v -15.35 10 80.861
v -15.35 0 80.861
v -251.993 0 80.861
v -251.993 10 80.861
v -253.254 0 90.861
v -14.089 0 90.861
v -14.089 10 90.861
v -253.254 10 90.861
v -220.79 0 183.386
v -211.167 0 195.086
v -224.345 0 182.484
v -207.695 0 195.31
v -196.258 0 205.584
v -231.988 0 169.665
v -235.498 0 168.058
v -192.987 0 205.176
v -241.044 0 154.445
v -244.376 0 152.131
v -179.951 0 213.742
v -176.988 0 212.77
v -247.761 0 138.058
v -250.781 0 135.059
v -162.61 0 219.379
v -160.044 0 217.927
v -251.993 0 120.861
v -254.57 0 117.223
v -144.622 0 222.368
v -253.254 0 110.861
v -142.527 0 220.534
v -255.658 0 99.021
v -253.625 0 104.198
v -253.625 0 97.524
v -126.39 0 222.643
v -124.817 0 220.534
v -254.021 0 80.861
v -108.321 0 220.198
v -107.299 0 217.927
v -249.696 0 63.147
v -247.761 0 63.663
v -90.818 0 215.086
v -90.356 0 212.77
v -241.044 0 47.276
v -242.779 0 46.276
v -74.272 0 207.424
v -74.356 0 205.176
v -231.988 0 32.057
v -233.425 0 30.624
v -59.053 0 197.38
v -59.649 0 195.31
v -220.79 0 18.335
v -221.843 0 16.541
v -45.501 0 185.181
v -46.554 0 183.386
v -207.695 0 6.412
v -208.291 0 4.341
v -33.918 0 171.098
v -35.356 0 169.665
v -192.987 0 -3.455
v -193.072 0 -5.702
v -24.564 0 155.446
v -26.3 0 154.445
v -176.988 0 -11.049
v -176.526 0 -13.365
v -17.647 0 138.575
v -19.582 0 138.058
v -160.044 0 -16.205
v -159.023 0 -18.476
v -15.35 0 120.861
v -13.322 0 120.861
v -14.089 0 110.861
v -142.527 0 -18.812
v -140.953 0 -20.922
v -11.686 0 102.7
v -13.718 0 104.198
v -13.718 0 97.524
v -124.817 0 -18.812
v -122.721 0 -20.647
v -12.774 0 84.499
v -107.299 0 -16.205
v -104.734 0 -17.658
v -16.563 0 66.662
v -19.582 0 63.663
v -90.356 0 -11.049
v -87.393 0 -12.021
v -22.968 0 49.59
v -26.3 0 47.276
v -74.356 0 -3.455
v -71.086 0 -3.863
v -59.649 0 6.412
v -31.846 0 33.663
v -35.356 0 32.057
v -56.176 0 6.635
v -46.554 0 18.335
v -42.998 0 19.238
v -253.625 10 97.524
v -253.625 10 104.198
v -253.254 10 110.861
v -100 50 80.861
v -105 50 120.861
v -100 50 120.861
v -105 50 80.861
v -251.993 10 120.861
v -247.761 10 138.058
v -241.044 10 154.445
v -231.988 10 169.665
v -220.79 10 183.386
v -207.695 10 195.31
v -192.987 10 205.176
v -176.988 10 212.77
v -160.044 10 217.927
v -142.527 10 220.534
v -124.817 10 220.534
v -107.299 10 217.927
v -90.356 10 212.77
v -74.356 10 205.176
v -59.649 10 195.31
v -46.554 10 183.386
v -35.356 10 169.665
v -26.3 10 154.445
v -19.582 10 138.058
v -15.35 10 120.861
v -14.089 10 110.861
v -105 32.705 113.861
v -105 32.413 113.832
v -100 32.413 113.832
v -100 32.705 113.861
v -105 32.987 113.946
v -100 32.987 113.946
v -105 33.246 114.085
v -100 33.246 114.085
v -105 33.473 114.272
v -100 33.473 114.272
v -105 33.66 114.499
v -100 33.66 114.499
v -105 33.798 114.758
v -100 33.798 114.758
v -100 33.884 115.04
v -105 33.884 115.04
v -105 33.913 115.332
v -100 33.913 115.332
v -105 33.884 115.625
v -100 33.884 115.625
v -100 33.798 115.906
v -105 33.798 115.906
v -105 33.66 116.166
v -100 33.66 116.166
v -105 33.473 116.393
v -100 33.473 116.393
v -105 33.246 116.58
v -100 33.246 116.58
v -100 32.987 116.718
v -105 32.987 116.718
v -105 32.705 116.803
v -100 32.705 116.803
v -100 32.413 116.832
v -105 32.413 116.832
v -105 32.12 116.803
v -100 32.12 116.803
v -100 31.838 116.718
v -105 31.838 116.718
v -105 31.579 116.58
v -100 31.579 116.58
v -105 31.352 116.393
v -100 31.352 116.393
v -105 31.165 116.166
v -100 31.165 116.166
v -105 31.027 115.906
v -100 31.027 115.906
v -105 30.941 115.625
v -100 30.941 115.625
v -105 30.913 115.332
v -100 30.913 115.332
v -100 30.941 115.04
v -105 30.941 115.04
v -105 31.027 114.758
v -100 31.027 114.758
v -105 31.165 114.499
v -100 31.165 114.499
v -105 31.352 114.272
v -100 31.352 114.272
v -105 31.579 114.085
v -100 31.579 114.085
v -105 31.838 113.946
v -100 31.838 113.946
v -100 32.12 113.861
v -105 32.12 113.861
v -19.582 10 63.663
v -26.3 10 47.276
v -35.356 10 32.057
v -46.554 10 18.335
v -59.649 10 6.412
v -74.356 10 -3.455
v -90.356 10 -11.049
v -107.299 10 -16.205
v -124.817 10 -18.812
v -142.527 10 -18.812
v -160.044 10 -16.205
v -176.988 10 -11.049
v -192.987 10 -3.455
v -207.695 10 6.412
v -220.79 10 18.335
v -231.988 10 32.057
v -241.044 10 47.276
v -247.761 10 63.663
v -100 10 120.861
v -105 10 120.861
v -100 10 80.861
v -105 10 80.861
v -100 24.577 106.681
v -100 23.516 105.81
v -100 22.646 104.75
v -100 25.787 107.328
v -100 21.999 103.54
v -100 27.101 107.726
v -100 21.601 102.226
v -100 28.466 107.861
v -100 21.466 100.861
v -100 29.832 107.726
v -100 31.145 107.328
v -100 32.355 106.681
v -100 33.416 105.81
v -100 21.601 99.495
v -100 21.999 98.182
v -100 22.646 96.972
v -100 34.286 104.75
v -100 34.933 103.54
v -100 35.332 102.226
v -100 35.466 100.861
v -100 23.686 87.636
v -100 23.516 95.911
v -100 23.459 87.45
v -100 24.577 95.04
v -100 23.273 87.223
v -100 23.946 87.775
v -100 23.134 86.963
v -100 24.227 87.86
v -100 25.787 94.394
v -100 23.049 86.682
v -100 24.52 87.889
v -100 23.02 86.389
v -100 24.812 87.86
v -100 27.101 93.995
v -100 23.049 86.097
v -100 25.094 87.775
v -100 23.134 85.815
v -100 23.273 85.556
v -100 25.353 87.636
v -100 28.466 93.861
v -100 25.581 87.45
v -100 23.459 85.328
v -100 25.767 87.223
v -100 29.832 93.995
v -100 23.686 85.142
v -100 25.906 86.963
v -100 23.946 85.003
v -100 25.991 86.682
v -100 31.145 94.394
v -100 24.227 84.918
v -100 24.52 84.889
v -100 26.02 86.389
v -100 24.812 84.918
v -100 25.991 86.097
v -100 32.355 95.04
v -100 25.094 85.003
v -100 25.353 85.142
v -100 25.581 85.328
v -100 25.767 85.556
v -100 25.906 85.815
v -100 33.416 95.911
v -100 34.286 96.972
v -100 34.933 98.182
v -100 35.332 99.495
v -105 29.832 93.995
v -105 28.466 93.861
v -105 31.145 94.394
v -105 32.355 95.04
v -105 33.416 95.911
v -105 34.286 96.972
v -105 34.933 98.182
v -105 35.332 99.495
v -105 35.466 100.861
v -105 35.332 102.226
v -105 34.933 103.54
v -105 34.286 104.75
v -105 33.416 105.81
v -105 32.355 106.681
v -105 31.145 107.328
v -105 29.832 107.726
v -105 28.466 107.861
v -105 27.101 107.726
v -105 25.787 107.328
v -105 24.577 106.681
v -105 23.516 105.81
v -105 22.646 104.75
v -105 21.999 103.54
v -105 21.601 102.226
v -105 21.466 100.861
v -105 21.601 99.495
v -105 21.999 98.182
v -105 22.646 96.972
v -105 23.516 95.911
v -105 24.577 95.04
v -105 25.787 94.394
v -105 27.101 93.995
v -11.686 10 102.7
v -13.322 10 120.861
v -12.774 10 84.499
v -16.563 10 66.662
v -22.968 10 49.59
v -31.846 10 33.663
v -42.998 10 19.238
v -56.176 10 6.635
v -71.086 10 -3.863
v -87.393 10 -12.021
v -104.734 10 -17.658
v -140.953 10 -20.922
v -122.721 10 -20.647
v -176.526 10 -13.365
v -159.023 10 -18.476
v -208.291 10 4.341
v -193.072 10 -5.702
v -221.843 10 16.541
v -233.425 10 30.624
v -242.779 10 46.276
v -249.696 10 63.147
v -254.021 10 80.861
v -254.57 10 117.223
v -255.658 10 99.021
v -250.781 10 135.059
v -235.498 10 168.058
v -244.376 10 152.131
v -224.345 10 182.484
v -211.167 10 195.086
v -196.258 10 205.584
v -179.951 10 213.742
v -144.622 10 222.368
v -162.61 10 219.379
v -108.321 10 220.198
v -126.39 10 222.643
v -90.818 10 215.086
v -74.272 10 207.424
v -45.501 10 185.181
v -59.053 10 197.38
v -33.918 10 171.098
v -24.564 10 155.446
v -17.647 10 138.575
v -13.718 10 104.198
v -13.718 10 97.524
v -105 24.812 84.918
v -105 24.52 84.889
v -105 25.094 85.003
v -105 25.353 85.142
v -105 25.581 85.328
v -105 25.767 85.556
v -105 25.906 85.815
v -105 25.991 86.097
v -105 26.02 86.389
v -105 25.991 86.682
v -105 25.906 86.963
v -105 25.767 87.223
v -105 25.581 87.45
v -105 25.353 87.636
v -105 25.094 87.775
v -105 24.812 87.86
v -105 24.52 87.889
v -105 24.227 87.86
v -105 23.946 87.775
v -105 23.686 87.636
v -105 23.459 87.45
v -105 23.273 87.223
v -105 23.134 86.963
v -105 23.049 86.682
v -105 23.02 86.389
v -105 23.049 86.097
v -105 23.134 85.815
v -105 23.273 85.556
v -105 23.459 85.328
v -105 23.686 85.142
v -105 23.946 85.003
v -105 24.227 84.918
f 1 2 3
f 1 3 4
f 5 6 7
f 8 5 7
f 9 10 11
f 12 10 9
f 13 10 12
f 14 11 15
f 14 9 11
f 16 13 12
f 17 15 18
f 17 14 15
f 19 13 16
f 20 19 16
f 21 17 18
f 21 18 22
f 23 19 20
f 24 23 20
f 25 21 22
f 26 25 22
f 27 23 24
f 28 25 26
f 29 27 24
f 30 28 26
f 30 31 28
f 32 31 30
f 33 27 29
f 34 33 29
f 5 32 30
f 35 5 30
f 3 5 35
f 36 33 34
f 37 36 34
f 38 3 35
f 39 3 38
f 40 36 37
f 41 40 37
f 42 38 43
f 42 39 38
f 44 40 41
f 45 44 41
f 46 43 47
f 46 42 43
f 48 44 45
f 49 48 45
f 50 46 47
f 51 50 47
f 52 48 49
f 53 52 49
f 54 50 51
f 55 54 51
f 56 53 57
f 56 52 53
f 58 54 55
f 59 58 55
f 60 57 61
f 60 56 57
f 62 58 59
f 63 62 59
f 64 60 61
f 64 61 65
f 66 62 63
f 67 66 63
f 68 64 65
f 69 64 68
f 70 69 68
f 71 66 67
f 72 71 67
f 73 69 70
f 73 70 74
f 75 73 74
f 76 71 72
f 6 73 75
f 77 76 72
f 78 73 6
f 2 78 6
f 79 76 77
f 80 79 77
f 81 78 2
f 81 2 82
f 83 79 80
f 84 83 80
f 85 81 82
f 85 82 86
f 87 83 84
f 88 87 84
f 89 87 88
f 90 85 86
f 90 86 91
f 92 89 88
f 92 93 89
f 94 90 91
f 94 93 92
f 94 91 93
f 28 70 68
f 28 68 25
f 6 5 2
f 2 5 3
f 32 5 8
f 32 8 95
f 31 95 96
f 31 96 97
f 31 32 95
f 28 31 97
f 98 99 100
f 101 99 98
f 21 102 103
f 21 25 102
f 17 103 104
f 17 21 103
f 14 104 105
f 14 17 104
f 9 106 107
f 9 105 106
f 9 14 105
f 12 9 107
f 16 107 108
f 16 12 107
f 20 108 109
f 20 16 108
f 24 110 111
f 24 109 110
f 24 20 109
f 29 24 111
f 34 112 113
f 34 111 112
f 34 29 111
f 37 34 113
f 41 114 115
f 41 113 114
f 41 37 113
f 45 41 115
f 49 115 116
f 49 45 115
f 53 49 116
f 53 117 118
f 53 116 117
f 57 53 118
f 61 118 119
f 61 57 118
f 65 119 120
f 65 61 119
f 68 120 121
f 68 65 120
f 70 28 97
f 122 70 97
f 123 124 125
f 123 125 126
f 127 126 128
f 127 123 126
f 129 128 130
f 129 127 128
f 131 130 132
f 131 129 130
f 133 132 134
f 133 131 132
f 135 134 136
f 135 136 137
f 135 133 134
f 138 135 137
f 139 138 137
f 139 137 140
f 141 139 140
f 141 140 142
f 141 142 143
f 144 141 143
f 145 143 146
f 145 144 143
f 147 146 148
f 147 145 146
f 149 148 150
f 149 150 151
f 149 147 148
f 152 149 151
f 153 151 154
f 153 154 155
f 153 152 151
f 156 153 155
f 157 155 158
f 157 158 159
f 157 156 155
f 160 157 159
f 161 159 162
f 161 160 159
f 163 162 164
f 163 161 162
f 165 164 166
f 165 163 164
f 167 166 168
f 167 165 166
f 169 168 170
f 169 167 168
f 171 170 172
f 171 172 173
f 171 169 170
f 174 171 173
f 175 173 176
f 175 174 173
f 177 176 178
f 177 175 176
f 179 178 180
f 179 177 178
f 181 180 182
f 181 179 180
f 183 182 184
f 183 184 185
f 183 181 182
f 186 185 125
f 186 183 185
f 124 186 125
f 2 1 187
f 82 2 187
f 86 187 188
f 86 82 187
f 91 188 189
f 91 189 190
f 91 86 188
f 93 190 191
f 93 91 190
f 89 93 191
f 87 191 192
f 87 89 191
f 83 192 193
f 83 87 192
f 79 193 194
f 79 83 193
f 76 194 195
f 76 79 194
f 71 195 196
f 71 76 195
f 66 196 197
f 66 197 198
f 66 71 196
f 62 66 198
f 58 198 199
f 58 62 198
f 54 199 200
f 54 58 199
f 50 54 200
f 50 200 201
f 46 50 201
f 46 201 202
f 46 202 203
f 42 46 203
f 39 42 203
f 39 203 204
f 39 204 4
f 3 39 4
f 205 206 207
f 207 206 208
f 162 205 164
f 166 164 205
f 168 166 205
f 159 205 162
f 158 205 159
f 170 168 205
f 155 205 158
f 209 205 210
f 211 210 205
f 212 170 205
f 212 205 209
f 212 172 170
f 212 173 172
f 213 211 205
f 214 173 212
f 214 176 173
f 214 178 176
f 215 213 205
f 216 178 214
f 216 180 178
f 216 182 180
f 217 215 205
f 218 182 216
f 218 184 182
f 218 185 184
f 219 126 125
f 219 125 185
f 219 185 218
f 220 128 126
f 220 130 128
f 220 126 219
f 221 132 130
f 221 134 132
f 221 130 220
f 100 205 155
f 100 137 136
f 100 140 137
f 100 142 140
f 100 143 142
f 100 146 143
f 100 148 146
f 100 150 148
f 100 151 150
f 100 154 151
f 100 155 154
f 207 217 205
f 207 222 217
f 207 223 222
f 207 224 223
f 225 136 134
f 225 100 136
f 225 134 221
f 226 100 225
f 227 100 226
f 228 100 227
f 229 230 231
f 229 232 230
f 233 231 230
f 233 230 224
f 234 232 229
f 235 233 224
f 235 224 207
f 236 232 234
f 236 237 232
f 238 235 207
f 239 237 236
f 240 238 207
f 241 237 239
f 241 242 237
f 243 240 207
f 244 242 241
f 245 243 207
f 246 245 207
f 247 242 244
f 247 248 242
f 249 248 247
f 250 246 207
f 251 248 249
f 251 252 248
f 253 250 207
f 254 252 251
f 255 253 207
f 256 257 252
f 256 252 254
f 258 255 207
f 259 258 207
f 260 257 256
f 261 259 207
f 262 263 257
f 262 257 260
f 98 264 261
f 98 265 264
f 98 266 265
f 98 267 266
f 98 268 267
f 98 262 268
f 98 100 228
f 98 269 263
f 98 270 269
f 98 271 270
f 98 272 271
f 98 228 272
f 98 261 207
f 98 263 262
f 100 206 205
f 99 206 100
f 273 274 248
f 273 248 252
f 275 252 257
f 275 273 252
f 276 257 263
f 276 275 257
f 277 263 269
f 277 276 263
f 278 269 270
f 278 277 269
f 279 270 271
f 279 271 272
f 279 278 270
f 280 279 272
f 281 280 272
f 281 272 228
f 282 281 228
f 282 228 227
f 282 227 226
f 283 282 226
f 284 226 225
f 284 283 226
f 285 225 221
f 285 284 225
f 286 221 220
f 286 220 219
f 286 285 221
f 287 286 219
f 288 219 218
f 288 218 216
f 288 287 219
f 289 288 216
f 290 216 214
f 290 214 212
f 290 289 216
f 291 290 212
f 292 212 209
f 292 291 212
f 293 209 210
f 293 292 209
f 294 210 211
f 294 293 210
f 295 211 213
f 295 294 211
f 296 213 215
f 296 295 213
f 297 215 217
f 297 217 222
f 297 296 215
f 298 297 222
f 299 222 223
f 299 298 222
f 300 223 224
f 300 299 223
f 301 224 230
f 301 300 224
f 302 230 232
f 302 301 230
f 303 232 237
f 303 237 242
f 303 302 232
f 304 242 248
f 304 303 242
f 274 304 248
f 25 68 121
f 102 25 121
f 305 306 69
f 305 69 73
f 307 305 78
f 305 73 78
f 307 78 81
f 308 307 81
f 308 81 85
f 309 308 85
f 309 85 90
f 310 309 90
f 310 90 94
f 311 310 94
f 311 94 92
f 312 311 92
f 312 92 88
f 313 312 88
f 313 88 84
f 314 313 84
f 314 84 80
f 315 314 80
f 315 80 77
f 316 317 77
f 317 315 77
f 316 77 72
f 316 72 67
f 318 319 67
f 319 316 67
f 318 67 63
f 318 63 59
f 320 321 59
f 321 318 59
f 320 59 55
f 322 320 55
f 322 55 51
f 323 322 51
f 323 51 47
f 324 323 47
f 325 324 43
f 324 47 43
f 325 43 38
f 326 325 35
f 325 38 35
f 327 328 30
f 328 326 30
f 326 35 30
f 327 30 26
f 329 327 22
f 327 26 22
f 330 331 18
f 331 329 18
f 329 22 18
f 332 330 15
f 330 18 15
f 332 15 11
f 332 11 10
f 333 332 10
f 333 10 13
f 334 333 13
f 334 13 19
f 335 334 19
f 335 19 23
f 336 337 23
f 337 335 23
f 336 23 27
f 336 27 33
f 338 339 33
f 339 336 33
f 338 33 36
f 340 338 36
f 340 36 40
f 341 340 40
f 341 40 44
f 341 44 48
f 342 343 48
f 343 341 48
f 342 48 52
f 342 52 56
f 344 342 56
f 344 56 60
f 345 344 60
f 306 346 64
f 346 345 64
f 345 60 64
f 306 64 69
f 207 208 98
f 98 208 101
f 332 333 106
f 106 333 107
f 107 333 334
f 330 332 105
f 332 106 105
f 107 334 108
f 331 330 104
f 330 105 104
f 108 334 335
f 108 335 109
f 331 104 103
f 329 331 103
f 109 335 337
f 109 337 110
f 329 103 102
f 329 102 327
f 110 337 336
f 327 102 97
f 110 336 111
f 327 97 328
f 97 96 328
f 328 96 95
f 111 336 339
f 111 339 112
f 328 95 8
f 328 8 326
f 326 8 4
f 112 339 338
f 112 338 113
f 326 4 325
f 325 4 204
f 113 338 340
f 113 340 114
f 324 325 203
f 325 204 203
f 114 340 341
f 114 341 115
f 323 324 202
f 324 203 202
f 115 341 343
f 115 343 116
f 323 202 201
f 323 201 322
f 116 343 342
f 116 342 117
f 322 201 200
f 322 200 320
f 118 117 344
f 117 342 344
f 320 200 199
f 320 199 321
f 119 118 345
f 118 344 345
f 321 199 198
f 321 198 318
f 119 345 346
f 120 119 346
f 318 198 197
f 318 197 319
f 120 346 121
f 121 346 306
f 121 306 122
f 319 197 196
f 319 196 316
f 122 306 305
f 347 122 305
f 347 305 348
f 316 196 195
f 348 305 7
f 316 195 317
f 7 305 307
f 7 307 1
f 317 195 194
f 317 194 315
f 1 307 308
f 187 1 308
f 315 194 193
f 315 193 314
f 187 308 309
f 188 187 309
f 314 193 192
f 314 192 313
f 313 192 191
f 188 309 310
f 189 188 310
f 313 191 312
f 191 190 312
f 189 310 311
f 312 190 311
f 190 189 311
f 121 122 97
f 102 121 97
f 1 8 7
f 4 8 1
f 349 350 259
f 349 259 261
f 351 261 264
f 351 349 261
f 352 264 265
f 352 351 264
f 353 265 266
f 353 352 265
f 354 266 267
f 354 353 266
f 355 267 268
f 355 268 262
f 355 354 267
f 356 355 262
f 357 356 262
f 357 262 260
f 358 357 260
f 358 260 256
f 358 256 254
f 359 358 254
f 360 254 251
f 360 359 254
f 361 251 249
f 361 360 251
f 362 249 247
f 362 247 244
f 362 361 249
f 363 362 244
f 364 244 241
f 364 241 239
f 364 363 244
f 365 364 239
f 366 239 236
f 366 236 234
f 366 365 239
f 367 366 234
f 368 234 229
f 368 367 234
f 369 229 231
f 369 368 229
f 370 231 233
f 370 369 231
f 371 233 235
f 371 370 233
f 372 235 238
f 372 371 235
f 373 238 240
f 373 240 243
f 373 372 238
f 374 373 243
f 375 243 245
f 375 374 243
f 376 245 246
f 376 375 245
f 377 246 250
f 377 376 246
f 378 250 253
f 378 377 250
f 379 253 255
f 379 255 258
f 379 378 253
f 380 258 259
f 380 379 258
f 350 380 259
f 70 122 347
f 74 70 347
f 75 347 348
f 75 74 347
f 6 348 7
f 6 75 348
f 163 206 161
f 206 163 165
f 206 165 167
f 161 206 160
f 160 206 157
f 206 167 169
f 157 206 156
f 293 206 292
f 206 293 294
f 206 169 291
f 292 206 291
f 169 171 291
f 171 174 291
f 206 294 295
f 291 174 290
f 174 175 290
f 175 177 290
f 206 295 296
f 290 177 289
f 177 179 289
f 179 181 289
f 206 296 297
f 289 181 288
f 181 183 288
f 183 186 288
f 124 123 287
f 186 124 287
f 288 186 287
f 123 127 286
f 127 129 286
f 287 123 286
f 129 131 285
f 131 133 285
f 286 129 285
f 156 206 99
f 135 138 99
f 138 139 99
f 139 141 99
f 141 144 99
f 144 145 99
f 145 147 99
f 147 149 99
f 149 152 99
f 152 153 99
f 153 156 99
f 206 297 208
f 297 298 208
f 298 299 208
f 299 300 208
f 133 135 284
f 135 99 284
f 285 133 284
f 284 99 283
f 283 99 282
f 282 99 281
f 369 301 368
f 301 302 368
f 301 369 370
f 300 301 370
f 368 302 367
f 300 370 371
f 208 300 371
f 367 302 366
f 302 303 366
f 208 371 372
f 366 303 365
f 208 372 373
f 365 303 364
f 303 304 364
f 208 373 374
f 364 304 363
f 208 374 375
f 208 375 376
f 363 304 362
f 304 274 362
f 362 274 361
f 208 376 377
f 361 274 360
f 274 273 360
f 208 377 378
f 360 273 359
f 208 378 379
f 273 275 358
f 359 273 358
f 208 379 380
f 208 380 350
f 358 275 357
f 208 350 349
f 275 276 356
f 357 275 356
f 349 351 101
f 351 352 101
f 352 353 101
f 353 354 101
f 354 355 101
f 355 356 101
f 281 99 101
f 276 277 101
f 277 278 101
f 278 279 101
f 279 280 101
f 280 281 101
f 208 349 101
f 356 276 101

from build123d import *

# Parameters (mm, degrees)
SKETCH1_R               = 122
SKETCH1_R_2             = 120
BOSS_EXTRUDE1_DEPTH     = 10
SKETCH2_W               = 10
SKETCH2_H               = 10
BOSS_EXTRUDE2_DEPTH     = 300
CUT_EXTRUDE5_DEPTH      = 374.854124119
CUT_EXTRUDE5_DEPTH_BACK = 374.854124119
SKETCH3_OUTSIDE_W       = 379.366
SKETCH3_OUTSIDE_H       = 323.366
SKETCH3_OUTSIDE_R       = 122
BOSS_EXTRUDE3_START     = -105
SKETCH4_W               = 40
SKETCH4_H               = 40
SKETCH4_R               = 1.5
SKETCH4_R_2             = 7
BOSS_EXTRUDE3_DEPTH     = 5


with BuildPart() as part:
    # Sketch1 → Boss-Extrude1 (new body)
    with BuildSketch(Plane(origin=(0, 0, 0), x_dir=(1, 0, 0), z_dir=(0, 1, 0))):
        with Locations(Location((-133.671737878, -100.860732568, 0), (0, 0, 270))):
            Circle(SKETCH1_R)
        with Locations(Location((-133.671737878, -100.860732568, 0), (0, 0, 270))):
            Circle(SKETCH1_R_2, mode=Mode.SUBTRACT)
    extrude(amount=BOSS_EXTRUDE1_DEPTH)

    # Sketch2 → Boss-Extrude2 (add)
    with BuildSketch(Plane(origin=(0, 0, 0), x_dir=(0, 0, -1), z_dir=(1, 0, 0))):
        with Locations((-115.860732568, 5)):
            Rectangle(SKETCH2_W, SKETCH2_H)
        with Locations((-85.860732568, 5)):
            Rectangle(SKETCH2_W, SKETCH2_H)
    extrude(amount=-BOSS_EXTRUDE2_DEPTH)

    # Sketch3 outside → Cut-Extrude5 (cut, two sides: drawn at the far end of the back side and taken through both)
    with BuildSketch(Plane(origin=(0, 0, 0), x_dir=(1, 0, 0), z_dir=(0, 1, 0)).offset(-CUT_EXTRUDE5_DEPTH_BACK)):
        with Locations((-150, -100.861)):
            Rectangle(SKETCH3_OUTSIDE_W, SKETCH3_OUTSIDE_H)
        with Locations(Location((-133.671737878, -100.860732568, 0), (0, 0, 270))):
            Circle(SKETCH3_OUTSIDE_R, mode=Mode.SUBTRACT)
    extrude(amount=CUT_EXTRUDE5_DEPTH + CUT_EXTRUDE5_DEPTH_BACK, mode=Mode.SUBTRACT)


with BuildPart() as body_2:
    # Sketch4 → Boss-Extrude3 (new body)
    with BuildSketch(Plane(origin=(0, 0, 0), x_dir=(0, 0, -1), z_dir=(1, 0, 0)).offset(BOSS_EXTRUDE3_START)):
        with Locations((-100.860732568, 30)):
            Rectangle(SKETCH4_W, SKETCH4_H)
        with Locations((-86.38915947, 24.519848777)):
            Circle(SKETCH4_R, mode=Mode.SUBTRACT)
        with Locations((-115.332305667, 32.412521849)):
            Circle(SKETCH4_R, mode=Mode.SUBTRACT)
        with Locations((-100.860732568, 28.466185313)):
            Circle(SKETCH4_R_2, mode=Mode.SUBTRACT)
    extrude(amount=BOSS_EXTRUDE3_DEPTH)


solid = Compound([part.part, body_2.part])
